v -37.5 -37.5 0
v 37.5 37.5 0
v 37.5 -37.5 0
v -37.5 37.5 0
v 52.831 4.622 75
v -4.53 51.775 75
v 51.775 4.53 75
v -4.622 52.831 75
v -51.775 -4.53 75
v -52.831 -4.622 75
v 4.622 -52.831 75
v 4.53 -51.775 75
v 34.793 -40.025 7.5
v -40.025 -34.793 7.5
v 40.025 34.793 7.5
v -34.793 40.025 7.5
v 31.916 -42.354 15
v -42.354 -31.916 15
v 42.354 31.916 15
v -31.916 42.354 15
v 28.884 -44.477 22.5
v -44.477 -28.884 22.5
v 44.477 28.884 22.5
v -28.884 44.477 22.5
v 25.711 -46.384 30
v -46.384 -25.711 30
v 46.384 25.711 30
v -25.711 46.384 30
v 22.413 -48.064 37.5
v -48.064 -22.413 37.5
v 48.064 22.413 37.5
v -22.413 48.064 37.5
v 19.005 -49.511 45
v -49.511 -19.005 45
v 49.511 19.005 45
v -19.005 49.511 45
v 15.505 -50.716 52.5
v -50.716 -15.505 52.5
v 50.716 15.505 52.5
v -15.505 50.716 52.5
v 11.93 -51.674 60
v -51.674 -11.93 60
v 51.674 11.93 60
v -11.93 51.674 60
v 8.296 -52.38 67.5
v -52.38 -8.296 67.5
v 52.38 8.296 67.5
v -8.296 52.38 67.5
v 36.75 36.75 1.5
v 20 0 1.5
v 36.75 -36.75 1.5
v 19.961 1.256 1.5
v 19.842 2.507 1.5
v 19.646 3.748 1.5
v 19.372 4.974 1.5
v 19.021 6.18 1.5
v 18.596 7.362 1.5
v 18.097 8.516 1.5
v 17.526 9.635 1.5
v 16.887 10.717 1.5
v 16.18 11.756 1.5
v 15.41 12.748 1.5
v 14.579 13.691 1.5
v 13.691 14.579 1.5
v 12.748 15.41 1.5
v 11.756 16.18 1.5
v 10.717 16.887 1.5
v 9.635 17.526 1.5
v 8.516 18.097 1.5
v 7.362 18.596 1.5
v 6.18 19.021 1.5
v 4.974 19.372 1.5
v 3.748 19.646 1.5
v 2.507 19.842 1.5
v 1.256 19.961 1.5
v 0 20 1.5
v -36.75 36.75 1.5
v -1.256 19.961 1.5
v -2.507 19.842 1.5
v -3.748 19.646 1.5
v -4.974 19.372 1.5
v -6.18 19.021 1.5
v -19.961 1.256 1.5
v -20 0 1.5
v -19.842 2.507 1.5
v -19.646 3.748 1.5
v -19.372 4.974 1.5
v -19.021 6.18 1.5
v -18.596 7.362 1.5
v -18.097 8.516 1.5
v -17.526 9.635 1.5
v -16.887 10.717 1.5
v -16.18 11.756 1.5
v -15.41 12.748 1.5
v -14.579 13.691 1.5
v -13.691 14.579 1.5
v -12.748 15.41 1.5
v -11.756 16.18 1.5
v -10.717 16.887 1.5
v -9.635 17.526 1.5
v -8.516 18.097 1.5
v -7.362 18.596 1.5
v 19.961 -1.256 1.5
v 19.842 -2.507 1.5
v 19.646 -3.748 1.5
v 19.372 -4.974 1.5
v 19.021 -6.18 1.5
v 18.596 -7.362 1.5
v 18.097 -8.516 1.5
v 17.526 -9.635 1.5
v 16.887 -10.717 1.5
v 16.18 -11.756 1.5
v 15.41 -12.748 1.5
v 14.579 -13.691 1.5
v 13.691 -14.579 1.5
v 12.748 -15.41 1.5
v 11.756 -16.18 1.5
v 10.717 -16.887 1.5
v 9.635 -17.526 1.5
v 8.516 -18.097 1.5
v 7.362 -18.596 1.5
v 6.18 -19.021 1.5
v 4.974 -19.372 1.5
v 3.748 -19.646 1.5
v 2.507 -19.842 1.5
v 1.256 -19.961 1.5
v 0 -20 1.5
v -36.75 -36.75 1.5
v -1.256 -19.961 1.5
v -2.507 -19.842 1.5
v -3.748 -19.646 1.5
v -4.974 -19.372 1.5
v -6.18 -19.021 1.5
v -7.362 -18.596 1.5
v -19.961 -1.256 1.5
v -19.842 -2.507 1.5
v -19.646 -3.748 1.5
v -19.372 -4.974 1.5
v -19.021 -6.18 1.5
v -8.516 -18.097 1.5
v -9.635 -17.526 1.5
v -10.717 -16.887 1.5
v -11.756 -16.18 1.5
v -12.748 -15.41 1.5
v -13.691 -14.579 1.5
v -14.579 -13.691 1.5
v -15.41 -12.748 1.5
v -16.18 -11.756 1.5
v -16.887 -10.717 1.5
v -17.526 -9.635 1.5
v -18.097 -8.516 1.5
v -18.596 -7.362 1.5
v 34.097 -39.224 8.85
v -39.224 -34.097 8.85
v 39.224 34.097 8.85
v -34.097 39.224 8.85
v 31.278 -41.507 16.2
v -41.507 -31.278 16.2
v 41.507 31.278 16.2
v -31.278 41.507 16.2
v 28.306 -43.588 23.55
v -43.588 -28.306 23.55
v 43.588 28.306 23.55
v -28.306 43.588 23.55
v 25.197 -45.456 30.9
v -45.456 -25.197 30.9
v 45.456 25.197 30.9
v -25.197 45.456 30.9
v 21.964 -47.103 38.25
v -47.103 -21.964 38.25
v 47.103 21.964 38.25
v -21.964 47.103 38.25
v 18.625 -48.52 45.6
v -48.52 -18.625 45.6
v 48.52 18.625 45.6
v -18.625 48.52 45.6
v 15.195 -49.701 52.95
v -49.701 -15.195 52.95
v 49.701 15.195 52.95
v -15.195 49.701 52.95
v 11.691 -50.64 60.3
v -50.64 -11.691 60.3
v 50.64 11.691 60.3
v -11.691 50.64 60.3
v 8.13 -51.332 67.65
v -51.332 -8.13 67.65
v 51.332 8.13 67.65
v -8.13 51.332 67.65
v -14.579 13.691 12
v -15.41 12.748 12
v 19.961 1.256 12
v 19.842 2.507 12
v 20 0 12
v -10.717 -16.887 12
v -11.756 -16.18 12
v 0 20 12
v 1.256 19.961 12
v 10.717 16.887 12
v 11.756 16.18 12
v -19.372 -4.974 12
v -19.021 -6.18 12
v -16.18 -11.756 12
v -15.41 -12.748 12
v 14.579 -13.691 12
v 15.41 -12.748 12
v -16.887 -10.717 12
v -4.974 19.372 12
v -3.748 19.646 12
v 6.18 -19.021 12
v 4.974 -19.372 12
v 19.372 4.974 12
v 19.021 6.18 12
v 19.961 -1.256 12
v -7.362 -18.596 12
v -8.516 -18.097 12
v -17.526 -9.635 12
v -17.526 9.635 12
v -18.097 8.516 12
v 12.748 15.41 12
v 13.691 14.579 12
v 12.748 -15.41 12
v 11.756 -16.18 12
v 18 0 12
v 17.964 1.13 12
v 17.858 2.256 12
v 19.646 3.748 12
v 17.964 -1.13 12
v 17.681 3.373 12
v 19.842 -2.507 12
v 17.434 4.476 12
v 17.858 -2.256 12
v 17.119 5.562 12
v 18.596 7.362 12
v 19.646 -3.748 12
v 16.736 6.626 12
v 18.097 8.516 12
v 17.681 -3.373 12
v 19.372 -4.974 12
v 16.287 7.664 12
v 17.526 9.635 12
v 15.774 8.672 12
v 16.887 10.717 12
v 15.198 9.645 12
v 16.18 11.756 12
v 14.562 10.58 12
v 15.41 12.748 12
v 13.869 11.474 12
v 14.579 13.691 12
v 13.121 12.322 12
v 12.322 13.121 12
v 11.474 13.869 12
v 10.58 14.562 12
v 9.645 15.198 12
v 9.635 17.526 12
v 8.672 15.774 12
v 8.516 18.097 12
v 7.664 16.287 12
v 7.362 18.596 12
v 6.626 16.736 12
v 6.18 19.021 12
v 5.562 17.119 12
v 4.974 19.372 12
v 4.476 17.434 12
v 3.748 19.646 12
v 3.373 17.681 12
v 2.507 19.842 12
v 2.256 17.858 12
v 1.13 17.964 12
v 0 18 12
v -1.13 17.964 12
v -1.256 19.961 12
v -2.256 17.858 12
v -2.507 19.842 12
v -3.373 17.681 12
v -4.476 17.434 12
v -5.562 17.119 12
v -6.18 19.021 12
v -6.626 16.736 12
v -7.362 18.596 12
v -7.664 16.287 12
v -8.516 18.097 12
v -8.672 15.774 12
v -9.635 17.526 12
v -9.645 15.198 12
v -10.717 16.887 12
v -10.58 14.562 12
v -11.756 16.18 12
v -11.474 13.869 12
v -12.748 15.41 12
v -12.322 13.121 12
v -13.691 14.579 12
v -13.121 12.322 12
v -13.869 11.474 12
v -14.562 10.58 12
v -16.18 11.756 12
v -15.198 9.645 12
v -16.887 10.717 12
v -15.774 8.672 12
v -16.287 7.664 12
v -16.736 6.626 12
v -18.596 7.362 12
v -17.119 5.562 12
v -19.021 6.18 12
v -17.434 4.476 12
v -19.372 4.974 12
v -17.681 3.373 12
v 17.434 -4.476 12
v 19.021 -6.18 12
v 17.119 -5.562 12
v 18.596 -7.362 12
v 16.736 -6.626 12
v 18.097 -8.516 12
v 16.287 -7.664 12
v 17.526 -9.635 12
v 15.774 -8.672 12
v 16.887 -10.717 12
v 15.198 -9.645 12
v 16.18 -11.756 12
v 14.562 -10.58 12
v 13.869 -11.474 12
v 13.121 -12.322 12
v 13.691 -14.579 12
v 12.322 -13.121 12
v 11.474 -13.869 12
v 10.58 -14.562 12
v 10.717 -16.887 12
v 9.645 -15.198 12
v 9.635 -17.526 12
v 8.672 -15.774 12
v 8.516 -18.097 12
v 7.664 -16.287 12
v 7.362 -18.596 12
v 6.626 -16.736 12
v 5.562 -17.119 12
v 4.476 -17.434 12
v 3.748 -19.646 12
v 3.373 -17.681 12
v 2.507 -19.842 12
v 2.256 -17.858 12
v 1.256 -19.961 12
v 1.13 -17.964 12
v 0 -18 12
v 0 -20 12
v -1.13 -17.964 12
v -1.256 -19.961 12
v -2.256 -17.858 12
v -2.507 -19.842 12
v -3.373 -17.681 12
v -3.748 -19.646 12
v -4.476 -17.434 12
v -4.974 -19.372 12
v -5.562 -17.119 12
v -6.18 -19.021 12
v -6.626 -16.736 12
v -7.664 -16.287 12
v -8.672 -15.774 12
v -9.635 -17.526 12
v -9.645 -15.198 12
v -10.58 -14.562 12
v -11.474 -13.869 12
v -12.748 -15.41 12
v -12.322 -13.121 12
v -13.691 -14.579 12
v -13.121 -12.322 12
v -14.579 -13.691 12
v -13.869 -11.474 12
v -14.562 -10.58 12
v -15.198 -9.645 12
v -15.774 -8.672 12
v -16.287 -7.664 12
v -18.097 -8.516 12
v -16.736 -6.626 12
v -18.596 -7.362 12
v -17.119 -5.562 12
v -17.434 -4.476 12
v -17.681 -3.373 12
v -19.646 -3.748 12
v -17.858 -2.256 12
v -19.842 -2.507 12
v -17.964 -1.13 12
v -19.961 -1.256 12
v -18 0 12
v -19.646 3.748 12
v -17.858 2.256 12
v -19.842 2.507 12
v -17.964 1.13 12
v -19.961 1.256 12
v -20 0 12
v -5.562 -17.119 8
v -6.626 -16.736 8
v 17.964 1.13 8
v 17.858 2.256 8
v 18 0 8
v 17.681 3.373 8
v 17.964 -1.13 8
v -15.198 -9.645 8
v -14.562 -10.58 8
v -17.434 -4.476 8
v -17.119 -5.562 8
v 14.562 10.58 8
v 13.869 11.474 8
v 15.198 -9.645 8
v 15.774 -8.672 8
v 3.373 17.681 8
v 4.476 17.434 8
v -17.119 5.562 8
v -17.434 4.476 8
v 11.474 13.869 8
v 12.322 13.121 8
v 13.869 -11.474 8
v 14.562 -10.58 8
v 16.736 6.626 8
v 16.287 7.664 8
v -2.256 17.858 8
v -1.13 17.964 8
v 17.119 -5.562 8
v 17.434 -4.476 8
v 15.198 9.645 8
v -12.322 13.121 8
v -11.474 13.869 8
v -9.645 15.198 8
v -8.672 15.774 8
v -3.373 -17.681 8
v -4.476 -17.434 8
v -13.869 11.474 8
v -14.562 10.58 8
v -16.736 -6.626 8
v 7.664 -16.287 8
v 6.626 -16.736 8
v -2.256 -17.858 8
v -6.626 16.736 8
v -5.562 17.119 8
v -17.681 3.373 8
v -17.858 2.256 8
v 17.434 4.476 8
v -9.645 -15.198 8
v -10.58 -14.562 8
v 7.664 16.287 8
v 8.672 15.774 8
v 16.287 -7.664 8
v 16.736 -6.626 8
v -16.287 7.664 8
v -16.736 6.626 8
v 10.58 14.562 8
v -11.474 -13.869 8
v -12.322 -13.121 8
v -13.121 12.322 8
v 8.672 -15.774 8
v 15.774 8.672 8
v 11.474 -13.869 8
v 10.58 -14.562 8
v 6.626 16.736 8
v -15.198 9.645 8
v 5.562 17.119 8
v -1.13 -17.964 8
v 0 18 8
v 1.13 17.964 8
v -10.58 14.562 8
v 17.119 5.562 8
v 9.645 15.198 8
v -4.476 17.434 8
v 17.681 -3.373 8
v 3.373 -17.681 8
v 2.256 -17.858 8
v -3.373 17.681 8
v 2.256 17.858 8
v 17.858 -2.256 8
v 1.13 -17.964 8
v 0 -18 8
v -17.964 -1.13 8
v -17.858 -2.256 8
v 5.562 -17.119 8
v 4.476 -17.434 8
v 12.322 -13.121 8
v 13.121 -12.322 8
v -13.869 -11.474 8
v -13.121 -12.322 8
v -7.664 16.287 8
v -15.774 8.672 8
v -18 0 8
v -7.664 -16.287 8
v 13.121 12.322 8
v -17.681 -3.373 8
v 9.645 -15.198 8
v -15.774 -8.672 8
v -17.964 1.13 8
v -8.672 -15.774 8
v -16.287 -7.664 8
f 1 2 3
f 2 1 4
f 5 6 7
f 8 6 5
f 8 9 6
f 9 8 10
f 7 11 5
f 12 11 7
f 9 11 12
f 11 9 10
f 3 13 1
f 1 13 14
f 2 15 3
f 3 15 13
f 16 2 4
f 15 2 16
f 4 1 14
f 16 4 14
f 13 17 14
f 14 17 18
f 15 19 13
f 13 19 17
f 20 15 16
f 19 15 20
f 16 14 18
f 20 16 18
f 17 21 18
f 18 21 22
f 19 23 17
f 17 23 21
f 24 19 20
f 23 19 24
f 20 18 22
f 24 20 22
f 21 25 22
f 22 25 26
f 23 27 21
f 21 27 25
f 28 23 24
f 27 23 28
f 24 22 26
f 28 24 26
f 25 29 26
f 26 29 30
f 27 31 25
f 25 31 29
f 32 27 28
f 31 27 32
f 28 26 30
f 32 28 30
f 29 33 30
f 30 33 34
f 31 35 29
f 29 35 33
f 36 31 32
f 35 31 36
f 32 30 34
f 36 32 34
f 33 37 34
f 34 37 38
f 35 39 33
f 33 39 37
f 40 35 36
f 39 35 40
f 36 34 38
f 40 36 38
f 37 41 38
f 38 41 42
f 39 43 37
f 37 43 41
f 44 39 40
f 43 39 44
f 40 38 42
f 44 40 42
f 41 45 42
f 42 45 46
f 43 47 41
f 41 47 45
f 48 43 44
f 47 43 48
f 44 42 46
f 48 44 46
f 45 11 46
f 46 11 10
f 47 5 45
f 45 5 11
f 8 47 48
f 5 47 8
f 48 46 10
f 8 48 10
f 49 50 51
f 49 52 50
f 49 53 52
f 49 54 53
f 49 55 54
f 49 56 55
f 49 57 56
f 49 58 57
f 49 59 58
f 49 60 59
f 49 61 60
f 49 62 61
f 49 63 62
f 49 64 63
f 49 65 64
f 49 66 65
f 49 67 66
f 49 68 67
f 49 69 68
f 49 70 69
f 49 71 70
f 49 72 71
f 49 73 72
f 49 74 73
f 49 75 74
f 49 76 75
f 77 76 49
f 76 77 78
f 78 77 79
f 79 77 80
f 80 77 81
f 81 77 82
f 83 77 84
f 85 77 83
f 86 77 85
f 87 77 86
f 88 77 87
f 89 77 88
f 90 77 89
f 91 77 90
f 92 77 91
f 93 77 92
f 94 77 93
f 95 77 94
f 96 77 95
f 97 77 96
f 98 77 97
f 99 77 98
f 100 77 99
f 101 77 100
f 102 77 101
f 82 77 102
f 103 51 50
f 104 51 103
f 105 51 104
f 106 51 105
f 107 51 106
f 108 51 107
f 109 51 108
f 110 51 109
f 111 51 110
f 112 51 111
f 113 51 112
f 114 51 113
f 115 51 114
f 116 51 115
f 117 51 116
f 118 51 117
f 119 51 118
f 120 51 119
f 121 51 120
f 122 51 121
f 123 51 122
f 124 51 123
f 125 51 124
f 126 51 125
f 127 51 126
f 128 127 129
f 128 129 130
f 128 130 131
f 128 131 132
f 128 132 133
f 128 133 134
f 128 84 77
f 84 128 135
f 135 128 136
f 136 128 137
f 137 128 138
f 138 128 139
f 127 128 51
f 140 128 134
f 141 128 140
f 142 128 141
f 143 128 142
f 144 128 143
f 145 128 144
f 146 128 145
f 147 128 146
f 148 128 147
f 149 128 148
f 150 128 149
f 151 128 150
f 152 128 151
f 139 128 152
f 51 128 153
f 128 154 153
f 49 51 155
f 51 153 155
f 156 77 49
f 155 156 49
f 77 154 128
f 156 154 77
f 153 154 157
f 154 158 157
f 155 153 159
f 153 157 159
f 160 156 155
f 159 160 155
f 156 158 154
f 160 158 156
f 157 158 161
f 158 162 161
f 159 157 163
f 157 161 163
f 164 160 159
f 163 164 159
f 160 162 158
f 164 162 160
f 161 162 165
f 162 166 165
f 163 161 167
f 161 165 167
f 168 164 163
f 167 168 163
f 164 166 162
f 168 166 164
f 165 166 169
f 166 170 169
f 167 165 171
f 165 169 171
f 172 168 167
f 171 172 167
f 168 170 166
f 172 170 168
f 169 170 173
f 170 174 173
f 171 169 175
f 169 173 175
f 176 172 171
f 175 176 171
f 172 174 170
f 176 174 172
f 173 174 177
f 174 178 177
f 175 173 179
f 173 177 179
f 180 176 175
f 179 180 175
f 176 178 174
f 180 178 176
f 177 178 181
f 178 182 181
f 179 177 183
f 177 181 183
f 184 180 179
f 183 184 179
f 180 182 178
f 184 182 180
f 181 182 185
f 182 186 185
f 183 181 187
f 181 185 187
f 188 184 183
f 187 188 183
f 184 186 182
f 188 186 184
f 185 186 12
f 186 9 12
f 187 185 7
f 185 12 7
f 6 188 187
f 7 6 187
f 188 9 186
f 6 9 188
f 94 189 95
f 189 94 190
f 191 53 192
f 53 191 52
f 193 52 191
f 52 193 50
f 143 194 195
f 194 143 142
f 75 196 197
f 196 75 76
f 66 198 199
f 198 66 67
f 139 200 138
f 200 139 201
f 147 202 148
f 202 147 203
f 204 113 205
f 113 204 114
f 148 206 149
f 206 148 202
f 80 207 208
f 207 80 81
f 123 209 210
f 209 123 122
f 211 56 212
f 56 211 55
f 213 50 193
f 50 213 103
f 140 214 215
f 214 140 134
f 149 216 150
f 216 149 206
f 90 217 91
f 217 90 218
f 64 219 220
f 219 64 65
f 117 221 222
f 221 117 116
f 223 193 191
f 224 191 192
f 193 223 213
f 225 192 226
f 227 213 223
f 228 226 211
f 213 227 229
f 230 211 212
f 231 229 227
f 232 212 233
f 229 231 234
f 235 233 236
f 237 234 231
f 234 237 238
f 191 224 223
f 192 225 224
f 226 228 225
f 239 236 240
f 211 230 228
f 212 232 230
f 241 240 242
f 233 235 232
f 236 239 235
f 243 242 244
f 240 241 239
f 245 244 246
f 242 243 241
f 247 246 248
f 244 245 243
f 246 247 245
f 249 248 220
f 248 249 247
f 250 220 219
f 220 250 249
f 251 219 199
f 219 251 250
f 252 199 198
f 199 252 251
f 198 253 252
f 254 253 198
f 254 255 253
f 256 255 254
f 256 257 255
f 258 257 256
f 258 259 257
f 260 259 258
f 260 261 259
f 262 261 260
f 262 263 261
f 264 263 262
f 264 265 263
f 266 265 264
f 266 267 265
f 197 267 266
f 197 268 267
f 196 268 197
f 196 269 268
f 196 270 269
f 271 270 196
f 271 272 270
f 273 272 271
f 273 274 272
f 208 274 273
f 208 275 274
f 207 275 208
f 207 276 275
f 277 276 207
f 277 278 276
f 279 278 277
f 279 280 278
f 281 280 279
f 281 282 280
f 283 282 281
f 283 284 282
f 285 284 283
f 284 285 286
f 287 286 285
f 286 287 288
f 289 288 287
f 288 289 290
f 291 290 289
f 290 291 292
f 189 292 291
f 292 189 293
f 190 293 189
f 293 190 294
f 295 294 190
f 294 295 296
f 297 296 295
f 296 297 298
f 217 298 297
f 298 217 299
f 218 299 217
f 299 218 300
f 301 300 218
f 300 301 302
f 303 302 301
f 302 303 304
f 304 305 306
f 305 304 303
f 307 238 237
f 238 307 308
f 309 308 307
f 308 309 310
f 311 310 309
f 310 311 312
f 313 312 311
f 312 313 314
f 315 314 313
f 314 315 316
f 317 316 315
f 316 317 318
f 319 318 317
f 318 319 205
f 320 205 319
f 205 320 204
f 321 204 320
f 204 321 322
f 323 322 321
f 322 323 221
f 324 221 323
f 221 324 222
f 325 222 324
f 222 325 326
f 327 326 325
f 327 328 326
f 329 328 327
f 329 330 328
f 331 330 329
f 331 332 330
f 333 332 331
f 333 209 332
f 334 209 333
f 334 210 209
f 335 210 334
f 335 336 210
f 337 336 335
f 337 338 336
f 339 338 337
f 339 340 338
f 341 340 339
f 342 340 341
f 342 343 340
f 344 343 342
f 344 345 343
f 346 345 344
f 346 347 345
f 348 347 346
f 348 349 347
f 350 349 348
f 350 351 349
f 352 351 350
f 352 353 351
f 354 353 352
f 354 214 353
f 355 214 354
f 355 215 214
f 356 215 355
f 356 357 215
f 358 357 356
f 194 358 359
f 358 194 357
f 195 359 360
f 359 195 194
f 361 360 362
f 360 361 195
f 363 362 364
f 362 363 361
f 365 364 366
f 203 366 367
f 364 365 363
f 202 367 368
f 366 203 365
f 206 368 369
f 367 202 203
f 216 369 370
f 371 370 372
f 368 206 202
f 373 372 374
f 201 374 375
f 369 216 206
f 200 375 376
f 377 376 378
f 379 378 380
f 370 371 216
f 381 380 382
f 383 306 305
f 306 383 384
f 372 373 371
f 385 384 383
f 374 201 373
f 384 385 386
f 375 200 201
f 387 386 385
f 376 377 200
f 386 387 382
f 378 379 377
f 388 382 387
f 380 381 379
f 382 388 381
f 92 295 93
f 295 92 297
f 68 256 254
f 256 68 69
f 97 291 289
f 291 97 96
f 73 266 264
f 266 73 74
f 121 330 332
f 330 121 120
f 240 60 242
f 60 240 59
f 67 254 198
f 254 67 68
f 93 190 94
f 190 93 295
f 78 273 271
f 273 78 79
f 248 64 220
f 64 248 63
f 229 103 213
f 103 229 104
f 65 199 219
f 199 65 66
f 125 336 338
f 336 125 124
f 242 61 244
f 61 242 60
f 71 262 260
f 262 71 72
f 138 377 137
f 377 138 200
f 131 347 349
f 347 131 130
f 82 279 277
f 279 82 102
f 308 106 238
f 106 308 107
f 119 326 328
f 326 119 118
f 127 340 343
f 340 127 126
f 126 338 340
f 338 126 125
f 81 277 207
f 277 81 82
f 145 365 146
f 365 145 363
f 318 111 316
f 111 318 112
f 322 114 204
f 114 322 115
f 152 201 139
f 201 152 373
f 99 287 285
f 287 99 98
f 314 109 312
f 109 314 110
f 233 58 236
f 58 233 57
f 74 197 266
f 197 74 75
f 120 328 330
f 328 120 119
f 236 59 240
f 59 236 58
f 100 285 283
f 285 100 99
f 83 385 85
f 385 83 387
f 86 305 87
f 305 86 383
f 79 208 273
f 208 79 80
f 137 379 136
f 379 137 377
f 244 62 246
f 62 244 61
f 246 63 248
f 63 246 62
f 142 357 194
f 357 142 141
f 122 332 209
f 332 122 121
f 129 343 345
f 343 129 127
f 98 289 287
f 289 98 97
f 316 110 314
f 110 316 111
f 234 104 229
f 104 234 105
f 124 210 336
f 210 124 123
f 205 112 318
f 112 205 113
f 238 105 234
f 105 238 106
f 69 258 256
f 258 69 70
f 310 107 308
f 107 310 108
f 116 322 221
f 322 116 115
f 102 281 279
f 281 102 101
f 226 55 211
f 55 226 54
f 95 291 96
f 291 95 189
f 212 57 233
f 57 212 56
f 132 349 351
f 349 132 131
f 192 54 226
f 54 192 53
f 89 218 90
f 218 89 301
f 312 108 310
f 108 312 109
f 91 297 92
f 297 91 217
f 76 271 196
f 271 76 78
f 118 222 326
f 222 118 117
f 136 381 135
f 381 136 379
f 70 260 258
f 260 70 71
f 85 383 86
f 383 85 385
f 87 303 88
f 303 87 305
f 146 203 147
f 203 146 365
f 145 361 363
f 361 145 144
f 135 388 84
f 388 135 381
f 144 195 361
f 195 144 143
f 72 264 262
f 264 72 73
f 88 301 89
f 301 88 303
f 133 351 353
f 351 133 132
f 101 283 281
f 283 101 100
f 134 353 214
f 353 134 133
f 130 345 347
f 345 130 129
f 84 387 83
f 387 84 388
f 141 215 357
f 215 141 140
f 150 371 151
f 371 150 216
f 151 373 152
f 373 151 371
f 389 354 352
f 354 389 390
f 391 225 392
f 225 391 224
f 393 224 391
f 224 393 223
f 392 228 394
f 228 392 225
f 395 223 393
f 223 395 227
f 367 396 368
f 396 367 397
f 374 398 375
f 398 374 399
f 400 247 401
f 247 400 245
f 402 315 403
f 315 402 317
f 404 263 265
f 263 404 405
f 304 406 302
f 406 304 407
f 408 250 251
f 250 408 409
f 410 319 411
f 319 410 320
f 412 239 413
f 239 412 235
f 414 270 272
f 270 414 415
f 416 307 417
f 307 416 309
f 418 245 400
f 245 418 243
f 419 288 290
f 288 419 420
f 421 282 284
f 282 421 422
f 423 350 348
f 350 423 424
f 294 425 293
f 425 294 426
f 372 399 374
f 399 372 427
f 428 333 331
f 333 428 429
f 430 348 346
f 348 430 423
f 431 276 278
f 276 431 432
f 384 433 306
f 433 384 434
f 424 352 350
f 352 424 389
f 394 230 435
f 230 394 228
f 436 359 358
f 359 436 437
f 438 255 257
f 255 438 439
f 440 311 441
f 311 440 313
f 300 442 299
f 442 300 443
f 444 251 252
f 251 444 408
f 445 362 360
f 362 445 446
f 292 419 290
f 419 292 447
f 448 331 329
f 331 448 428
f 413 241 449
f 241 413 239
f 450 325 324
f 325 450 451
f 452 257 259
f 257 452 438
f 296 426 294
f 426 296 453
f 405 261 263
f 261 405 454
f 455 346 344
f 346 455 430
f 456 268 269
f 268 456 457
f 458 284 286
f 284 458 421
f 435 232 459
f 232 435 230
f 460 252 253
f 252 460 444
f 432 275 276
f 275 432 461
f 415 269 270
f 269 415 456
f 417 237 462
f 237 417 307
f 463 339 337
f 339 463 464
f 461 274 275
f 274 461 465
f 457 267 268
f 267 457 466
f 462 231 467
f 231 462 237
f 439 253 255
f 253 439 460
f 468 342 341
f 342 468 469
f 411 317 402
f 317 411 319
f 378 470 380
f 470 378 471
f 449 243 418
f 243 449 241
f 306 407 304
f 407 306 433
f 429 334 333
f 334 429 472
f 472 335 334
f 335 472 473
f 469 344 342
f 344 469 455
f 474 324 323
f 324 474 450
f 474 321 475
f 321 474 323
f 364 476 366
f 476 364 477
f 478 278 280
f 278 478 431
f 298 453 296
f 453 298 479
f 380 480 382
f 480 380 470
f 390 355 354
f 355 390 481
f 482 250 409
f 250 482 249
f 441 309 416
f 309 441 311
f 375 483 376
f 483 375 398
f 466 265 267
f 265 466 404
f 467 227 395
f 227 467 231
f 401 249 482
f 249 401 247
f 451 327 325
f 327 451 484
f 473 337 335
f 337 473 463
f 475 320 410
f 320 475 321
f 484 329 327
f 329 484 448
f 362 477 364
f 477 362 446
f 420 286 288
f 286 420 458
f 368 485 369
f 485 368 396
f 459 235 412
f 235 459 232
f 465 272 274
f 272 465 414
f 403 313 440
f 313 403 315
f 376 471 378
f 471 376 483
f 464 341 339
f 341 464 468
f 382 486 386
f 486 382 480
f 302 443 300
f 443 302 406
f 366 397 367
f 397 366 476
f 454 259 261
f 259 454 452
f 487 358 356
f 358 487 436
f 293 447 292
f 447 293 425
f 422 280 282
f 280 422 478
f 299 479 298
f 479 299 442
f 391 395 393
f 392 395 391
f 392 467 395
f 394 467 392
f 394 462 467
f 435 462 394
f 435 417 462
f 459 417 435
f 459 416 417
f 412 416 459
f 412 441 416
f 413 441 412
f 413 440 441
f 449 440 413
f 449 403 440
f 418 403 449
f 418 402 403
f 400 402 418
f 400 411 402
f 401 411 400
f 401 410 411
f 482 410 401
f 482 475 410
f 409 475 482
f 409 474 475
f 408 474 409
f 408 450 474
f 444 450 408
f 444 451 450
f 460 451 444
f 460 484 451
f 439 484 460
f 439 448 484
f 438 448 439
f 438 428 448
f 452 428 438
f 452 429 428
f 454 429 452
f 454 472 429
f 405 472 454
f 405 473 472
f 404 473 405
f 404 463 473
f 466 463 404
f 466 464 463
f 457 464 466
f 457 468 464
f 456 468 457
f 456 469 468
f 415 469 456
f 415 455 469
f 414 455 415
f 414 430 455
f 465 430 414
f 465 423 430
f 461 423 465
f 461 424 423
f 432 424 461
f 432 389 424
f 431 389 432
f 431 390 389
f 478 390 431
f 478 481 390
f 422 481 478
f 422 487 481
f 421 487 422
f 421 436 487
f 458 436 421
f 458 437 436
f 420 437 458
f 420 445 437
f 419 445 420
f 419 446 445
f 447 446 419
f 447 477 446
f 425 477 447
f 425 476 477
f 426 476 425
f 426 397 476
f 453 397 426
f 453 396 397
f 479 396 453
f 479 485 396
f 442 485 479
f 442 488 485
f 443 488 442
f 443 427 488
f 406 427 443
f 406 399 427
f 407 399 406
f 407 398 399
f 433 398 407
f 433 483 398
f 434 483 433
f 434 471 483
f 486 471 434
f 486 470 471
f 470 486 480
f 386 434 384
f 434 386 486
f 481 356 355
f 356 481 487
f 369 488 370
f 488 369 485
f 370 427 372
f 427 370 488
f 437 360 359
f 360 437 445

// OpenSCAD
//variables
width = 75; // [50:150]
length = 75; // [50:150]
height = 75; // [50:150]
wallthickness = 1.5; // [1.5:5]
twist = 40; // [0:100]
resolution = 10; // [10:300]

// twisted shell
difference(){
linear_extrude(height = height , twist = twist , slices =  resolution ) square([ width , length ], center=true);
translate ([0,0, wallthickness ])
linear_extrude(height = height- wallthickness , twist = twist , slices = resolution ) square( [ width - wallthickness , length - wallthickness ] , center=true);
}

// candle support
difference(){
cylinder (h=12, r=20, $fn=100);
translate ([0,0,8]) cylinder (h=4, r=18, $fn=100);
}
